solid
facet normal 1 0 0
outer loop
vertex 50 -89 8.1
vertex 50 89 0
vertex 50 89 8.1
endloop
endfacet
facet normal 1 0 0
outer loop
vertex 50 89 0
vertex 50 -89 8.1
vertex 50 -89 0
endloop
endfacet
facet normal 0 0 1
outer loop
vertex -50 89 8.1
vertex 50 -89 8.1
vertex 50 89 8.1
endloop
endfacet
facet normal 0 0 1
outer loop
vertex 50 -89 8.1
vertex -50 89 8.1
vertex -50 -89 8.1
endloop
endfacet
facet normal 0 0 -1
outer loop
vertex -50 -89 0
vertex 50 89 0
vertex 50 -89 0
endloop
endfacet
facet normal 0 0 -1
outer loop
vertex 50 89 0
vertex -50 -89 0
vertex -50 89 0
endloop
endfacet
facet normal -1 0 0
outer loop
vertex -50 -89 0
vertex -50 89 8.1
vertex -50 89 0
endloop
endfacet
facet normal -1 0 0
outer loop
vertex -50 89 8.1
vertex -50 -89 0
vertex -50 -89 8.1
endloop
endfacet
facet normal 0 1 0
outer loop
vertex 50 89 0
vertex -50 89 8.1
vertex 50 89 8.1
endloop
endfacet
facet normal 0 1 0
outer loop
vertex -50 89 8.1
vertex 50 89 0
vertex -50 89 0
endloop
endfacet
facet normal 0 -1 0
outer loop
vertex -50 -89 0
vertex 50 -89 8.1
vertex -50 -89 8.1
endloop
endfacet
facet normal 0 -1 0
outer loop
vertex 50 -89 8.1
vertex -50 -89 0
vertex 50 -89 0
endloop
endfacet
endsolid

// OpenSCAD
difference() {
  translate([200,356,0]*-.5*.5)
    cube([200,356,0]*0.5 + [0,0,8.1]);
  
  translate([0,0,-0.01])
  scale([0.5,0.5,0.08])
    surface(file = "litho-sample.png", center = true, convexity = 5);
}
